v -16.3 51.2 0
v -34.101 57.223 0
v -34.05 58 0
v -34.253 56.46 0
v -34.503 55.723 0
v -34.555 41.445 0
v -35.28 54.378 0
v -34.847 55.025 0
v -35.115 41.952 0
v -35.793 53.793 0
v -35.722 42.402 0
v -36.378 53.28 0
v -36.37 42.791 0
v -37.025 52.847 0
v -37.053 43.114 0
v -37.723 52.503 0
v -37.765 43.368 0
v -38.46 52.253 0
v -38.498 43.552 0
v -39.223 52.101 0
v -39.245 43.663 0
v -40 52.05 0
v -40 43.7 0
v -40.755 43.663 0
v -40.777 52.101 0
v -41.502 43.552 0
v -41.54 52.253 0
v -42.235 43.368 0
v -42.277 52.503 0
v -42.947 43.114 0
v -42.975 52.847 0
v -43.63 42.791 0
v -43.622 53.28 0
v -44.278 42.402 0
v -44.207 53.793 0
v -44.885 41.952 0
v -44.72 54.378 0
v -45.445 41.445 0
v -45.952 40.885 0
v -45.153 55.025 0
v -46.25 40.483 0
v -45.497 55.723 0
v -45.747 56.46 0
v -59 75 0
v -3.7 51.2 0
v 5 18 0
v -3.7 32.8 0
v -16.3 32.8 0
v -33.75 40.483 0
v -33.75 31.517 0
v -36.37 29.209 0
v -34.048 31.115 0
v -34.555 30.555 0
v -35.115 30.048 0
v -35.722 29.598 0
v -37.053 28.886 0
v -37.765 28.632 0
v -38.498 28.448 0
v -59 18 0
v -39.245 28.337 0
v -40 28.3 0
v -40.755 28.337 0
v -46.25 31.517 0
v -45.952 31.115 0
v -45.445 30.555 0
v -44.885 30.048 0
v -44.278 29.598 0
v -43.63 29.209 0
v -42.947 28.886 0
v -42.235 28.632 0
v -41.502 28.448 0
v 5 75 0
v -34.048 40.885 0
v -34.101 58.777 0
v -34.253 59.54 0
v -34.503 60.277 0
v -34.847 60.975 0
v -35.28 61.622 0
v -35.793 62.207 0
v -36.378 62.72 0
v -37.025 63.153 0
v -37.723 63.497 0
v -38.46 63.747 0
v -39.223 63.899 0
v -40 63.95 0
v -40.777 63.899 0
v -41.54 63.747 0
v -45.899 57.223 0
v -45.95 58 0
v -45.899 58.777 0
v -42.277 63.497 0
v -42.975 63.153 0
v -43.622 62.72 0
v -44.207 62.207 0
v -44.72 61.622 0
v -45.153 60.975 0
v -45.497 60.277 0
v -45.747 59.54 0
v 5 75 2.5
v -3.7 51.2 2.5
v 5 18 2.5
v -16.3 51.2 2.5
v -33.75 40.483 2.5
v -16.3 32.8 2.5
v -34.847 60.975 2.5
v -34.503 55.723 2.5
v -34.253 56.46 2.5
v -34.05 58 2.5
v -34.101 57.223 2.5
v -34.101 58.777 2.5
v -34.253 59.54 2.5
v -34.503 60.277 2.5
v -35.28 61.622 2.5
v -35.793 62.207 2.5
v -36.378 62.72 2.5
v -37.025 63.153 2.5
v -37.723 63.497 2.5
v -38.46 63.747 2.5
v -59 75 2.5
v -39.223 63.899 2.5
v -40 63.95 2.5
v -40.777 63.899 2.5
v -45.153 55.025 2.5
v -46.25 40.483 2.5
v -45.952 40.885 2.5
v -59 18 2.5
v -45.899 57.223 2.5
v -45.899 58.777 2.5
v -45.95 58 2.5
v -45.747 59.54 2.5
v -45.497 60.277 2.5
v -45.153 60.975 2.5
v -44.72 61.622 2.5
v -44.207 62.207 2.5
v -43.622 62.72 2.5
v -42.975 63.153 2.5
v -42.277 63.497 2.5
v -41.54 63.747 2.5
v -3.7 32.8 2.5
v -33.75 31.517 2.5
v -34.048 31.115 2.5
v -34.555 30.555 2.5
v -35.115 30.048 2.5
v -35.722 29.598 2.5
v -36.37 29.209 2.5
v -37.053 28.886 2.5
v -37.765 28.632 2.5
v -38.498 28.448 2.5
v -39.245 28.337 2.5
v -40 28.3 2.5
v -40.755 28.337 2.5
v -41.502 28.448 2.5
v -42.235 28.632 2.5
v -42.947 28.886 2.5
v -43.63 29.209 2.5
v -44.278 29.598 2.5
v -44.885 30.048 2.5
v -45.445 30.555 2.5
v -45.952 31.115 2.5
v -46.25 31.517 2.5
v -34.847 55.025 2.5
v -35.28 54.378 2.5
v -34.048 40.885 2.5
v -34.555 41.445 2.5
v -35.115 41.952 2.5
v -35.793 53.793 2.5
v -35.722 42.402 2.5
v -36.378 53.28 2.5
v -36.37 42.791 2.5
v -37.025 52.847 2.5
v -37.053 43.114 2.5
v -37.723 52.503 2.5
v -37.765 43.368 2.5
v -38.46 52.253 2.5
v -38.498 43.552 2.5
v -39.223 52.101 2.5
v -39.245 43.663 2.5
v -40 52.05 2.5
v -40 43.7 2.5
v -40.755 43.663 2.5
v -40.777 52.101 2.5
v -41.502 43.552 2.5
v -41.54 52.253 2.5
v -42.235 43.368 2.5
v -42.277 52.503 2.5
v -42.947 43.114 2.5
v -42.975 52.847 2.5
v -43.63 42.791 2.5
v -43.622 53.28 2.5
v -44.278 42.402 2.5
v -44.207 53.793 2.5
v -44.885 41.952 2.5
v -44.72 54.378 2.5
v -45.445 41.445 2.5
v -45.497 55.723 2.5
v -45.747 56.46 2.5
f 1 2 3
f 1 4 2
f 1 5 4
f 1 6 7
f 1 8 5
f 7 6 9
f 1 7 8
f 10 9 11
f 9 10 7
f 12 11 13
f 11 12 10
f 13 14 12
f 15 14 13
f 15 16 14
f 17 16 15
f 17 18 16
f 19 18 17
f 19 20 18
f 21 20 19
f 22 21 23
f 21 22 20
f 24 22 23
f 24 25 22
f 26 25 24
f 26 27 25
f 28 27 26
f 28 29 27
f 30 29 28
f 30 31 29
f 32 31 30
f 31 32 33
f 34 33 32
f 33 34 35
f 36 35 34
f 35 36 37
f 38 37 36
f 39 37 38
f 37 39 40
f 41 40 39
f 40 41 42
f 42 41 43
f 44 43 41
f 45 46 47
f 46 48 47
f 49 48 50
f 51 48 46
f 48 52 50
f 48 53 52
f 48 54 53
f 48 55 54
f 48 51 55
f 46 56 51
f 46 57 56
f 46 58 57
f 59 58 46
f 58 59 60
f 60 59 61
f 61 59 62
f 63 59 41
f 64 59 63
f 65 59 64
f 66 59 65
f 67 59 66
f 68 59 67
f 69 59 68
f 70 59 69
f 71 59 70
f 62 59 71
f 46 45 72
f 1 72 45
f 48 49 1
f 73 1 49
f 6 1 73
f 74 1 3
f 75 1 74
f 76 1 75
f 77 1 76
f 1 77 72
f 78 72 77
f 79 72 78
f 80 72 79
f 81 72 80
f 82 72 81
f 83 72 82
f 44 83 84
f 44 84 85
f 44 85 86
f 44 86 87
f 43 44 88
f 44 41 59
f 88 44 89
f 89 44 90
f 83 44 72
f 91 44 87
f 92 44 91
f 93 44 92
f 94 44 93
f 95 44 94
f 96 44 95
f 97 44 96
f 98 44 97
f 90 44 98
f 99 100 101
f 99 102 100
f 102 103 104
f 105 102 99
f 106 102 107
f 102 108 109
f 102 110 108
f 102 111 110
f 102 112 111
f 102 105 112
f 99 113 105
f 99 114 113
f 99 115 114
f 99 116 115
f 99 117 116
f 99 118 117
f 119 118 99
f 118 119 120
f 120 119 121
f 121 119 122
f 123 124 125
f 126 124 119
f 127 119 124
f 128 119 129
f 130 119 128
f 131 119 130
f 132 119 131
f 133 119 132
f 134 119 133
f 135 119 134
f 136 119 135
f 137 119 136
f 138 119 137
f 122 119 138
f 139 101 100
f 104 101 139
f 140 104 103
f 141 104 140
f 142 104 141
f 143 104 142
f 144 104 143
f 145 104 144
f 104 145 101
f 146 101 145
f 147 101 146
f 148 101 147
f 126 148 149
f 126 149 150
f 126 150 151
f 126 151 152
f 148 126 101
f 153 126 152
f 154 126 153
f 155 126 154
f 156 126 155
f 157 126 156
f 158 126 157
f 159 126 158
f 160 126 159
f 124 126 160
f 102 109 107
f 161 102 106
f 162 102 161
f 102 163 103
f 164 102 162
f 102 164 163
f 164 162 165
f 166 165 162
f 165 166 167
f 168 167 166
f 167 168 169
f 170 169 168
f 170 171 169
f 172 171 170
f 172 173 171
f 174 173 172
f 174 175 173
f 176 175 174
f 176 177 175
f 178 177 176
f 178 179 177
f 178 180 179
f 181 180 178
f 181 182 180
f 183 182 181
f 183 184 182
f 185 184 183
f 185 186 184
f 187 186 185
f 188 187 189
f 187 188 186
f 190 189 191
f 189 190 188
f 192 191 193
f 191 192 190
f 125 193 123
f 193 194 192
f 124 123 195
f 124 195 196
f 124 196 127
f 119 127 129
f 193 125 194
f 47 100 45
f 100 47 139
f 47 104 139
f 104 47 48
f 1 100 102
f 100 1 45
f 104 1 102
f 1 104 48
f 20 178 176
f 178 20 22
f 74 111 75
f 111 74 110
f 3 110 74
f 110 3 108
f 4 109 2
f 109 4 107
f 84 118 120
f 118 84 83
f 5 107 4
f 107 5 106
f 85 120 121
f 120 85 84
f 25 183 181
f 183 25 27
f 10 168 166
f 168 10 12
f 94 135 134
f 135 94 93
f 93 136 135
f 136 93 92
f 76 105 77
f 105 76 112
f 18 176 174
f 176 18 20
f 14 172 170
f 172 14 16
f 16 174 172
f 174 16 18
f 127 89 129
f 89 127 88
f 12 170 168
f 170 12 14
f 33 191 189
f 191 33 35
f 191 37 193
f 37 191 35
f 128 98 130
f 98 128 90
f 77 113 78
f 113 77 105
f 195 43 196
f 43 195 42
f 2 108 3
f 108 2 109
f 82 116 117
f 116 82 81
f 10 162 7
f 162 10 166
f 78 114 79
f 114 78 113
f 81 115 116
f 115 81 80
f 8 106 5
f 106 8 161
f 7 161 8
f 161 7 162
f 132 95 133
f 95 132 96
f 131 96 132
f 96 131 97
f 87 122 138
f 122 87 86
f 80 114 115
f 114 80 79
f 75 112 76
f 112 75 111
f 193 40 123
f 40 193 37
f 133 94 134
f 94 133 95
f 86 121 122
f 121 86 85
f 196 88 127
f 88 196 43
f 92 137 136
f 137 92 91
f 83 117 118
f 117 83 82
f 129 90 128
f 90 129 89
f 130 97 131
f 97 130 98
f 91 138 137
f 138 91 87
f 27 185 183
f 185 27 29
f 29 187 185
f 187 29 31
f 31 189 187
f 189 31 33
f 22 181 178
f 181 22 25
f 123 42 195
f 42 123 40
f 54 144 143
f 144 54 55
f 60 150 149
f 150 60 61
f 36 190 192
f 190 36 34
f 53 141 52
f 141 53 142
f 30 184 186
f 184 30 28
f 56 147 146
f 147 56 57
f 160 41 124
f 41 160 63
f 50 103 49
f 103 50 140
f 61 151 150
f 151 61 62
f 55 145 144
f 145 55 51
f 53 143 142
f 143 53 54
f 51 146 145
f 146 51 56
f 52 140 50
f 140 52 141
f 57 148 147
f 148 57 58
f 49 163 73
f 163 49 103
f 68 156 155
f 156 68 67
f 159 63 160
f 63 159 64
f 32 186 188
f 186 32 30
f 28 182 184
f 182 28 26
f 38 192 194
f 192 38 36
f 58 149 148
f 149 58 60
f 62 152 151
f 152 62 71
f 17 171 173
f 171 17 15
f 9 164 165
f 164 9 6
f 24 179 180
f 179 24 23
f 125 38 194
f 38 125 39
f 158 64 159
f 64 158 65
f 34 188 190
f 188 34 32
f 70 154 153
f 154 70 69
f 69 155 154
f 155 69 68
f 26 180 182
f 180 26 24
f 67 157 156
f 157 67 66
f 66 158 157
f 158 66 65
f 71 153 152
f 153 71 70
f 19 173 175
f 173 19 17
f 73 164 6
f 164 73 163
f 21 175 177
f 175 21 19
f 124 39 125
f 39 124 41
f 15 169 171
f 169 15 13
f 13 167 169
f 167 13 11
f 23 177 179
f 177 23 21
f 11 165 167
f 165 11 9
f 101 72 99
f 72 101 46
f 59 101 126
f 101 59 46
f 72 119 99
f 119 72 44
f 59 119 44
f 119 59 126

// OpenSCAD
// file: ../level2.scad
// Level 2 - shared dimensions for the drive deck, motor bracket, body and skirt.
// Frame: origin at the centre of the deck's TOP surface; +Z up, +Y = front (display), +X = right.
// The lazy Susan sits on the deck's plinth; the turntable pulley hangs through the deck's hole.
include <params.scad>

// ---- outline -------------------------------------------------------------------------------
l2_size   = [160, 160];     // footprint (rounded square), same for body and skirt
l2_r      = 14;             // corner radius
l2_h      = 90;             // body height (floor to the deck's underside... see body)
l2_wall   = 2.5;            // body walls

// ---- deck ----------------------------------------------------------------------------------
deck_t    = 4;              // deck plate: z = -deck_t .. 0
deck_hole = 112;            // reach the inner ring's bolts from below during assembly

// ---- lazy Susan + turntable pulley (turntable_pulley.scad) --------------------------------
z_ls      = plinth_h;                    // lazy Susan's underside (on the plinth): 2
z_plate   = z_ls + ls_h;                 // turntable plate's underside = inner ring top: 12.5
belt_drop = 24.5;                        // plate underside -> belt centre (turntable_pulley)
z_belt    = z_plate - belt_drop;         // -12: belt centre, below the deck top
pulley_R  = 100 * 2 / PI / 2;            // 31.83: ring pulley pitch radius (100 T)
pulley_bottom = z_belt - 3.2 - 1.6 - 2.2;  // -19: lowest point of the hanging pulley
clamp_r   = 35.5;                        // pulley's belt clamp block (its widest part)

// ---- motor ----------------------------------------------------------------------------------
motor_a   = -45;            // direction of the motor from the centre: back-right corner
motor_C   = 46;             // nominal centre distance; the bracket slides +/- tension_travel (42..50:
                            //   at 41 the motor pulley would touch the ring pulley's flange)
tension_travel = 4;
nema      = [42.3, 33.4];   // NEMA17 (MEASURED body length; not a pancake): square, body length
nema_shaft = 17.5;          // MEASURED shaft length above the face
nema_holes = 31;            // M3 screw spacing on its face
nema_boss = 22;             // centring boss on its face (dia), ~2 tall
mp_T      = 20;             // motor pulley teeth
mp_belt_c = 13 + 7.1 / 2;   // MEASURED: pulley pushed fully down on the motor, its toothed section
                            //   (7.1 wide; the belt is a standard 6 mm) runs 13..20.1 above the face
bracket_t = 3;              // motor plate thickness; the pulley passes down through its centre hole
bracket_drop = 3;           // the motor hangs this much LOWER than "pulley pushed fully down" needs:
                            //   on the first build the ring pulley sat ~2 mm below the motor pulley,
                            //   so the motor pulley now starts ~1 mm low and is raised on the shaft
                            //   to line the belt up (a few mm of adjustment either way)
z_motor_face  = z_belt - mp_belt_c - bracket_drop;   // -31.55
z_bracket_top = z_motor_face + bracket_t;    // -28.55
z_motor_bottom = z_motor_face - nema[1];     // -64.95
z_mp_top  = z_motor_face + bracket_drop + 13 + 7.1 + 1;   // ~-7.45 (pulley raised to the belt; EST top flange ~1 mm)
// main file
// Back-panel fit test: the Level 2 body's back wall round the switch, fuse holder and barrel jack,
// cut straight from l2_body.scad (so it's identical to the real print) - to check before the long
// body print:
//   * rocker switch (body 12.3 x 17.1, upright): snaps into the plain 12.6 x 18.4 cut-out in the
//     2.5 mm wall and stays put; ON at the top
//   * fuse holder (6 x 30 mm): double-D hole - slides in, doesn't turn, ring nut tightens flat
//   * barrel jack (5.5 x 2.1 IP68, 11.2 mm thread): 11.5 mm hole, flange + gasket outside, nut
//     inside - goes in without forcing, nut pulls the gasket flat; its nut clears the fuse's
// PRINT outer face down (as modelled here), no supports. PETG, same settings as the body.
use <l2_body.scad>

margin = 8;                        // wall kept round the features
x0 = -40 - 11 - margin;            // fuse / jack column at x = -40 (fuse ring nut ~20 across) ...
x1 = 5;                            // ... switch at x = -10 (flange 14.8 wide); stops short of the cable exit
z0 = -58 - 9 - margin;             // jack centre z -58 (flange / nut ~18 across) ...
z1 = -36 + 10 + margin;            // ... fuse centre z -36 (ring nut ~20)

// lay the wall flat: outer face (y = -80) on the bed
translate([0, 0, 80]) rotate([90, 0, 0])
    intersection() {
        l2_body();
        translate([x0, -81, z0]) cube([x1 - x0, 6, z1 - z0]);    // the back wall only (2.5 thick)
    }
